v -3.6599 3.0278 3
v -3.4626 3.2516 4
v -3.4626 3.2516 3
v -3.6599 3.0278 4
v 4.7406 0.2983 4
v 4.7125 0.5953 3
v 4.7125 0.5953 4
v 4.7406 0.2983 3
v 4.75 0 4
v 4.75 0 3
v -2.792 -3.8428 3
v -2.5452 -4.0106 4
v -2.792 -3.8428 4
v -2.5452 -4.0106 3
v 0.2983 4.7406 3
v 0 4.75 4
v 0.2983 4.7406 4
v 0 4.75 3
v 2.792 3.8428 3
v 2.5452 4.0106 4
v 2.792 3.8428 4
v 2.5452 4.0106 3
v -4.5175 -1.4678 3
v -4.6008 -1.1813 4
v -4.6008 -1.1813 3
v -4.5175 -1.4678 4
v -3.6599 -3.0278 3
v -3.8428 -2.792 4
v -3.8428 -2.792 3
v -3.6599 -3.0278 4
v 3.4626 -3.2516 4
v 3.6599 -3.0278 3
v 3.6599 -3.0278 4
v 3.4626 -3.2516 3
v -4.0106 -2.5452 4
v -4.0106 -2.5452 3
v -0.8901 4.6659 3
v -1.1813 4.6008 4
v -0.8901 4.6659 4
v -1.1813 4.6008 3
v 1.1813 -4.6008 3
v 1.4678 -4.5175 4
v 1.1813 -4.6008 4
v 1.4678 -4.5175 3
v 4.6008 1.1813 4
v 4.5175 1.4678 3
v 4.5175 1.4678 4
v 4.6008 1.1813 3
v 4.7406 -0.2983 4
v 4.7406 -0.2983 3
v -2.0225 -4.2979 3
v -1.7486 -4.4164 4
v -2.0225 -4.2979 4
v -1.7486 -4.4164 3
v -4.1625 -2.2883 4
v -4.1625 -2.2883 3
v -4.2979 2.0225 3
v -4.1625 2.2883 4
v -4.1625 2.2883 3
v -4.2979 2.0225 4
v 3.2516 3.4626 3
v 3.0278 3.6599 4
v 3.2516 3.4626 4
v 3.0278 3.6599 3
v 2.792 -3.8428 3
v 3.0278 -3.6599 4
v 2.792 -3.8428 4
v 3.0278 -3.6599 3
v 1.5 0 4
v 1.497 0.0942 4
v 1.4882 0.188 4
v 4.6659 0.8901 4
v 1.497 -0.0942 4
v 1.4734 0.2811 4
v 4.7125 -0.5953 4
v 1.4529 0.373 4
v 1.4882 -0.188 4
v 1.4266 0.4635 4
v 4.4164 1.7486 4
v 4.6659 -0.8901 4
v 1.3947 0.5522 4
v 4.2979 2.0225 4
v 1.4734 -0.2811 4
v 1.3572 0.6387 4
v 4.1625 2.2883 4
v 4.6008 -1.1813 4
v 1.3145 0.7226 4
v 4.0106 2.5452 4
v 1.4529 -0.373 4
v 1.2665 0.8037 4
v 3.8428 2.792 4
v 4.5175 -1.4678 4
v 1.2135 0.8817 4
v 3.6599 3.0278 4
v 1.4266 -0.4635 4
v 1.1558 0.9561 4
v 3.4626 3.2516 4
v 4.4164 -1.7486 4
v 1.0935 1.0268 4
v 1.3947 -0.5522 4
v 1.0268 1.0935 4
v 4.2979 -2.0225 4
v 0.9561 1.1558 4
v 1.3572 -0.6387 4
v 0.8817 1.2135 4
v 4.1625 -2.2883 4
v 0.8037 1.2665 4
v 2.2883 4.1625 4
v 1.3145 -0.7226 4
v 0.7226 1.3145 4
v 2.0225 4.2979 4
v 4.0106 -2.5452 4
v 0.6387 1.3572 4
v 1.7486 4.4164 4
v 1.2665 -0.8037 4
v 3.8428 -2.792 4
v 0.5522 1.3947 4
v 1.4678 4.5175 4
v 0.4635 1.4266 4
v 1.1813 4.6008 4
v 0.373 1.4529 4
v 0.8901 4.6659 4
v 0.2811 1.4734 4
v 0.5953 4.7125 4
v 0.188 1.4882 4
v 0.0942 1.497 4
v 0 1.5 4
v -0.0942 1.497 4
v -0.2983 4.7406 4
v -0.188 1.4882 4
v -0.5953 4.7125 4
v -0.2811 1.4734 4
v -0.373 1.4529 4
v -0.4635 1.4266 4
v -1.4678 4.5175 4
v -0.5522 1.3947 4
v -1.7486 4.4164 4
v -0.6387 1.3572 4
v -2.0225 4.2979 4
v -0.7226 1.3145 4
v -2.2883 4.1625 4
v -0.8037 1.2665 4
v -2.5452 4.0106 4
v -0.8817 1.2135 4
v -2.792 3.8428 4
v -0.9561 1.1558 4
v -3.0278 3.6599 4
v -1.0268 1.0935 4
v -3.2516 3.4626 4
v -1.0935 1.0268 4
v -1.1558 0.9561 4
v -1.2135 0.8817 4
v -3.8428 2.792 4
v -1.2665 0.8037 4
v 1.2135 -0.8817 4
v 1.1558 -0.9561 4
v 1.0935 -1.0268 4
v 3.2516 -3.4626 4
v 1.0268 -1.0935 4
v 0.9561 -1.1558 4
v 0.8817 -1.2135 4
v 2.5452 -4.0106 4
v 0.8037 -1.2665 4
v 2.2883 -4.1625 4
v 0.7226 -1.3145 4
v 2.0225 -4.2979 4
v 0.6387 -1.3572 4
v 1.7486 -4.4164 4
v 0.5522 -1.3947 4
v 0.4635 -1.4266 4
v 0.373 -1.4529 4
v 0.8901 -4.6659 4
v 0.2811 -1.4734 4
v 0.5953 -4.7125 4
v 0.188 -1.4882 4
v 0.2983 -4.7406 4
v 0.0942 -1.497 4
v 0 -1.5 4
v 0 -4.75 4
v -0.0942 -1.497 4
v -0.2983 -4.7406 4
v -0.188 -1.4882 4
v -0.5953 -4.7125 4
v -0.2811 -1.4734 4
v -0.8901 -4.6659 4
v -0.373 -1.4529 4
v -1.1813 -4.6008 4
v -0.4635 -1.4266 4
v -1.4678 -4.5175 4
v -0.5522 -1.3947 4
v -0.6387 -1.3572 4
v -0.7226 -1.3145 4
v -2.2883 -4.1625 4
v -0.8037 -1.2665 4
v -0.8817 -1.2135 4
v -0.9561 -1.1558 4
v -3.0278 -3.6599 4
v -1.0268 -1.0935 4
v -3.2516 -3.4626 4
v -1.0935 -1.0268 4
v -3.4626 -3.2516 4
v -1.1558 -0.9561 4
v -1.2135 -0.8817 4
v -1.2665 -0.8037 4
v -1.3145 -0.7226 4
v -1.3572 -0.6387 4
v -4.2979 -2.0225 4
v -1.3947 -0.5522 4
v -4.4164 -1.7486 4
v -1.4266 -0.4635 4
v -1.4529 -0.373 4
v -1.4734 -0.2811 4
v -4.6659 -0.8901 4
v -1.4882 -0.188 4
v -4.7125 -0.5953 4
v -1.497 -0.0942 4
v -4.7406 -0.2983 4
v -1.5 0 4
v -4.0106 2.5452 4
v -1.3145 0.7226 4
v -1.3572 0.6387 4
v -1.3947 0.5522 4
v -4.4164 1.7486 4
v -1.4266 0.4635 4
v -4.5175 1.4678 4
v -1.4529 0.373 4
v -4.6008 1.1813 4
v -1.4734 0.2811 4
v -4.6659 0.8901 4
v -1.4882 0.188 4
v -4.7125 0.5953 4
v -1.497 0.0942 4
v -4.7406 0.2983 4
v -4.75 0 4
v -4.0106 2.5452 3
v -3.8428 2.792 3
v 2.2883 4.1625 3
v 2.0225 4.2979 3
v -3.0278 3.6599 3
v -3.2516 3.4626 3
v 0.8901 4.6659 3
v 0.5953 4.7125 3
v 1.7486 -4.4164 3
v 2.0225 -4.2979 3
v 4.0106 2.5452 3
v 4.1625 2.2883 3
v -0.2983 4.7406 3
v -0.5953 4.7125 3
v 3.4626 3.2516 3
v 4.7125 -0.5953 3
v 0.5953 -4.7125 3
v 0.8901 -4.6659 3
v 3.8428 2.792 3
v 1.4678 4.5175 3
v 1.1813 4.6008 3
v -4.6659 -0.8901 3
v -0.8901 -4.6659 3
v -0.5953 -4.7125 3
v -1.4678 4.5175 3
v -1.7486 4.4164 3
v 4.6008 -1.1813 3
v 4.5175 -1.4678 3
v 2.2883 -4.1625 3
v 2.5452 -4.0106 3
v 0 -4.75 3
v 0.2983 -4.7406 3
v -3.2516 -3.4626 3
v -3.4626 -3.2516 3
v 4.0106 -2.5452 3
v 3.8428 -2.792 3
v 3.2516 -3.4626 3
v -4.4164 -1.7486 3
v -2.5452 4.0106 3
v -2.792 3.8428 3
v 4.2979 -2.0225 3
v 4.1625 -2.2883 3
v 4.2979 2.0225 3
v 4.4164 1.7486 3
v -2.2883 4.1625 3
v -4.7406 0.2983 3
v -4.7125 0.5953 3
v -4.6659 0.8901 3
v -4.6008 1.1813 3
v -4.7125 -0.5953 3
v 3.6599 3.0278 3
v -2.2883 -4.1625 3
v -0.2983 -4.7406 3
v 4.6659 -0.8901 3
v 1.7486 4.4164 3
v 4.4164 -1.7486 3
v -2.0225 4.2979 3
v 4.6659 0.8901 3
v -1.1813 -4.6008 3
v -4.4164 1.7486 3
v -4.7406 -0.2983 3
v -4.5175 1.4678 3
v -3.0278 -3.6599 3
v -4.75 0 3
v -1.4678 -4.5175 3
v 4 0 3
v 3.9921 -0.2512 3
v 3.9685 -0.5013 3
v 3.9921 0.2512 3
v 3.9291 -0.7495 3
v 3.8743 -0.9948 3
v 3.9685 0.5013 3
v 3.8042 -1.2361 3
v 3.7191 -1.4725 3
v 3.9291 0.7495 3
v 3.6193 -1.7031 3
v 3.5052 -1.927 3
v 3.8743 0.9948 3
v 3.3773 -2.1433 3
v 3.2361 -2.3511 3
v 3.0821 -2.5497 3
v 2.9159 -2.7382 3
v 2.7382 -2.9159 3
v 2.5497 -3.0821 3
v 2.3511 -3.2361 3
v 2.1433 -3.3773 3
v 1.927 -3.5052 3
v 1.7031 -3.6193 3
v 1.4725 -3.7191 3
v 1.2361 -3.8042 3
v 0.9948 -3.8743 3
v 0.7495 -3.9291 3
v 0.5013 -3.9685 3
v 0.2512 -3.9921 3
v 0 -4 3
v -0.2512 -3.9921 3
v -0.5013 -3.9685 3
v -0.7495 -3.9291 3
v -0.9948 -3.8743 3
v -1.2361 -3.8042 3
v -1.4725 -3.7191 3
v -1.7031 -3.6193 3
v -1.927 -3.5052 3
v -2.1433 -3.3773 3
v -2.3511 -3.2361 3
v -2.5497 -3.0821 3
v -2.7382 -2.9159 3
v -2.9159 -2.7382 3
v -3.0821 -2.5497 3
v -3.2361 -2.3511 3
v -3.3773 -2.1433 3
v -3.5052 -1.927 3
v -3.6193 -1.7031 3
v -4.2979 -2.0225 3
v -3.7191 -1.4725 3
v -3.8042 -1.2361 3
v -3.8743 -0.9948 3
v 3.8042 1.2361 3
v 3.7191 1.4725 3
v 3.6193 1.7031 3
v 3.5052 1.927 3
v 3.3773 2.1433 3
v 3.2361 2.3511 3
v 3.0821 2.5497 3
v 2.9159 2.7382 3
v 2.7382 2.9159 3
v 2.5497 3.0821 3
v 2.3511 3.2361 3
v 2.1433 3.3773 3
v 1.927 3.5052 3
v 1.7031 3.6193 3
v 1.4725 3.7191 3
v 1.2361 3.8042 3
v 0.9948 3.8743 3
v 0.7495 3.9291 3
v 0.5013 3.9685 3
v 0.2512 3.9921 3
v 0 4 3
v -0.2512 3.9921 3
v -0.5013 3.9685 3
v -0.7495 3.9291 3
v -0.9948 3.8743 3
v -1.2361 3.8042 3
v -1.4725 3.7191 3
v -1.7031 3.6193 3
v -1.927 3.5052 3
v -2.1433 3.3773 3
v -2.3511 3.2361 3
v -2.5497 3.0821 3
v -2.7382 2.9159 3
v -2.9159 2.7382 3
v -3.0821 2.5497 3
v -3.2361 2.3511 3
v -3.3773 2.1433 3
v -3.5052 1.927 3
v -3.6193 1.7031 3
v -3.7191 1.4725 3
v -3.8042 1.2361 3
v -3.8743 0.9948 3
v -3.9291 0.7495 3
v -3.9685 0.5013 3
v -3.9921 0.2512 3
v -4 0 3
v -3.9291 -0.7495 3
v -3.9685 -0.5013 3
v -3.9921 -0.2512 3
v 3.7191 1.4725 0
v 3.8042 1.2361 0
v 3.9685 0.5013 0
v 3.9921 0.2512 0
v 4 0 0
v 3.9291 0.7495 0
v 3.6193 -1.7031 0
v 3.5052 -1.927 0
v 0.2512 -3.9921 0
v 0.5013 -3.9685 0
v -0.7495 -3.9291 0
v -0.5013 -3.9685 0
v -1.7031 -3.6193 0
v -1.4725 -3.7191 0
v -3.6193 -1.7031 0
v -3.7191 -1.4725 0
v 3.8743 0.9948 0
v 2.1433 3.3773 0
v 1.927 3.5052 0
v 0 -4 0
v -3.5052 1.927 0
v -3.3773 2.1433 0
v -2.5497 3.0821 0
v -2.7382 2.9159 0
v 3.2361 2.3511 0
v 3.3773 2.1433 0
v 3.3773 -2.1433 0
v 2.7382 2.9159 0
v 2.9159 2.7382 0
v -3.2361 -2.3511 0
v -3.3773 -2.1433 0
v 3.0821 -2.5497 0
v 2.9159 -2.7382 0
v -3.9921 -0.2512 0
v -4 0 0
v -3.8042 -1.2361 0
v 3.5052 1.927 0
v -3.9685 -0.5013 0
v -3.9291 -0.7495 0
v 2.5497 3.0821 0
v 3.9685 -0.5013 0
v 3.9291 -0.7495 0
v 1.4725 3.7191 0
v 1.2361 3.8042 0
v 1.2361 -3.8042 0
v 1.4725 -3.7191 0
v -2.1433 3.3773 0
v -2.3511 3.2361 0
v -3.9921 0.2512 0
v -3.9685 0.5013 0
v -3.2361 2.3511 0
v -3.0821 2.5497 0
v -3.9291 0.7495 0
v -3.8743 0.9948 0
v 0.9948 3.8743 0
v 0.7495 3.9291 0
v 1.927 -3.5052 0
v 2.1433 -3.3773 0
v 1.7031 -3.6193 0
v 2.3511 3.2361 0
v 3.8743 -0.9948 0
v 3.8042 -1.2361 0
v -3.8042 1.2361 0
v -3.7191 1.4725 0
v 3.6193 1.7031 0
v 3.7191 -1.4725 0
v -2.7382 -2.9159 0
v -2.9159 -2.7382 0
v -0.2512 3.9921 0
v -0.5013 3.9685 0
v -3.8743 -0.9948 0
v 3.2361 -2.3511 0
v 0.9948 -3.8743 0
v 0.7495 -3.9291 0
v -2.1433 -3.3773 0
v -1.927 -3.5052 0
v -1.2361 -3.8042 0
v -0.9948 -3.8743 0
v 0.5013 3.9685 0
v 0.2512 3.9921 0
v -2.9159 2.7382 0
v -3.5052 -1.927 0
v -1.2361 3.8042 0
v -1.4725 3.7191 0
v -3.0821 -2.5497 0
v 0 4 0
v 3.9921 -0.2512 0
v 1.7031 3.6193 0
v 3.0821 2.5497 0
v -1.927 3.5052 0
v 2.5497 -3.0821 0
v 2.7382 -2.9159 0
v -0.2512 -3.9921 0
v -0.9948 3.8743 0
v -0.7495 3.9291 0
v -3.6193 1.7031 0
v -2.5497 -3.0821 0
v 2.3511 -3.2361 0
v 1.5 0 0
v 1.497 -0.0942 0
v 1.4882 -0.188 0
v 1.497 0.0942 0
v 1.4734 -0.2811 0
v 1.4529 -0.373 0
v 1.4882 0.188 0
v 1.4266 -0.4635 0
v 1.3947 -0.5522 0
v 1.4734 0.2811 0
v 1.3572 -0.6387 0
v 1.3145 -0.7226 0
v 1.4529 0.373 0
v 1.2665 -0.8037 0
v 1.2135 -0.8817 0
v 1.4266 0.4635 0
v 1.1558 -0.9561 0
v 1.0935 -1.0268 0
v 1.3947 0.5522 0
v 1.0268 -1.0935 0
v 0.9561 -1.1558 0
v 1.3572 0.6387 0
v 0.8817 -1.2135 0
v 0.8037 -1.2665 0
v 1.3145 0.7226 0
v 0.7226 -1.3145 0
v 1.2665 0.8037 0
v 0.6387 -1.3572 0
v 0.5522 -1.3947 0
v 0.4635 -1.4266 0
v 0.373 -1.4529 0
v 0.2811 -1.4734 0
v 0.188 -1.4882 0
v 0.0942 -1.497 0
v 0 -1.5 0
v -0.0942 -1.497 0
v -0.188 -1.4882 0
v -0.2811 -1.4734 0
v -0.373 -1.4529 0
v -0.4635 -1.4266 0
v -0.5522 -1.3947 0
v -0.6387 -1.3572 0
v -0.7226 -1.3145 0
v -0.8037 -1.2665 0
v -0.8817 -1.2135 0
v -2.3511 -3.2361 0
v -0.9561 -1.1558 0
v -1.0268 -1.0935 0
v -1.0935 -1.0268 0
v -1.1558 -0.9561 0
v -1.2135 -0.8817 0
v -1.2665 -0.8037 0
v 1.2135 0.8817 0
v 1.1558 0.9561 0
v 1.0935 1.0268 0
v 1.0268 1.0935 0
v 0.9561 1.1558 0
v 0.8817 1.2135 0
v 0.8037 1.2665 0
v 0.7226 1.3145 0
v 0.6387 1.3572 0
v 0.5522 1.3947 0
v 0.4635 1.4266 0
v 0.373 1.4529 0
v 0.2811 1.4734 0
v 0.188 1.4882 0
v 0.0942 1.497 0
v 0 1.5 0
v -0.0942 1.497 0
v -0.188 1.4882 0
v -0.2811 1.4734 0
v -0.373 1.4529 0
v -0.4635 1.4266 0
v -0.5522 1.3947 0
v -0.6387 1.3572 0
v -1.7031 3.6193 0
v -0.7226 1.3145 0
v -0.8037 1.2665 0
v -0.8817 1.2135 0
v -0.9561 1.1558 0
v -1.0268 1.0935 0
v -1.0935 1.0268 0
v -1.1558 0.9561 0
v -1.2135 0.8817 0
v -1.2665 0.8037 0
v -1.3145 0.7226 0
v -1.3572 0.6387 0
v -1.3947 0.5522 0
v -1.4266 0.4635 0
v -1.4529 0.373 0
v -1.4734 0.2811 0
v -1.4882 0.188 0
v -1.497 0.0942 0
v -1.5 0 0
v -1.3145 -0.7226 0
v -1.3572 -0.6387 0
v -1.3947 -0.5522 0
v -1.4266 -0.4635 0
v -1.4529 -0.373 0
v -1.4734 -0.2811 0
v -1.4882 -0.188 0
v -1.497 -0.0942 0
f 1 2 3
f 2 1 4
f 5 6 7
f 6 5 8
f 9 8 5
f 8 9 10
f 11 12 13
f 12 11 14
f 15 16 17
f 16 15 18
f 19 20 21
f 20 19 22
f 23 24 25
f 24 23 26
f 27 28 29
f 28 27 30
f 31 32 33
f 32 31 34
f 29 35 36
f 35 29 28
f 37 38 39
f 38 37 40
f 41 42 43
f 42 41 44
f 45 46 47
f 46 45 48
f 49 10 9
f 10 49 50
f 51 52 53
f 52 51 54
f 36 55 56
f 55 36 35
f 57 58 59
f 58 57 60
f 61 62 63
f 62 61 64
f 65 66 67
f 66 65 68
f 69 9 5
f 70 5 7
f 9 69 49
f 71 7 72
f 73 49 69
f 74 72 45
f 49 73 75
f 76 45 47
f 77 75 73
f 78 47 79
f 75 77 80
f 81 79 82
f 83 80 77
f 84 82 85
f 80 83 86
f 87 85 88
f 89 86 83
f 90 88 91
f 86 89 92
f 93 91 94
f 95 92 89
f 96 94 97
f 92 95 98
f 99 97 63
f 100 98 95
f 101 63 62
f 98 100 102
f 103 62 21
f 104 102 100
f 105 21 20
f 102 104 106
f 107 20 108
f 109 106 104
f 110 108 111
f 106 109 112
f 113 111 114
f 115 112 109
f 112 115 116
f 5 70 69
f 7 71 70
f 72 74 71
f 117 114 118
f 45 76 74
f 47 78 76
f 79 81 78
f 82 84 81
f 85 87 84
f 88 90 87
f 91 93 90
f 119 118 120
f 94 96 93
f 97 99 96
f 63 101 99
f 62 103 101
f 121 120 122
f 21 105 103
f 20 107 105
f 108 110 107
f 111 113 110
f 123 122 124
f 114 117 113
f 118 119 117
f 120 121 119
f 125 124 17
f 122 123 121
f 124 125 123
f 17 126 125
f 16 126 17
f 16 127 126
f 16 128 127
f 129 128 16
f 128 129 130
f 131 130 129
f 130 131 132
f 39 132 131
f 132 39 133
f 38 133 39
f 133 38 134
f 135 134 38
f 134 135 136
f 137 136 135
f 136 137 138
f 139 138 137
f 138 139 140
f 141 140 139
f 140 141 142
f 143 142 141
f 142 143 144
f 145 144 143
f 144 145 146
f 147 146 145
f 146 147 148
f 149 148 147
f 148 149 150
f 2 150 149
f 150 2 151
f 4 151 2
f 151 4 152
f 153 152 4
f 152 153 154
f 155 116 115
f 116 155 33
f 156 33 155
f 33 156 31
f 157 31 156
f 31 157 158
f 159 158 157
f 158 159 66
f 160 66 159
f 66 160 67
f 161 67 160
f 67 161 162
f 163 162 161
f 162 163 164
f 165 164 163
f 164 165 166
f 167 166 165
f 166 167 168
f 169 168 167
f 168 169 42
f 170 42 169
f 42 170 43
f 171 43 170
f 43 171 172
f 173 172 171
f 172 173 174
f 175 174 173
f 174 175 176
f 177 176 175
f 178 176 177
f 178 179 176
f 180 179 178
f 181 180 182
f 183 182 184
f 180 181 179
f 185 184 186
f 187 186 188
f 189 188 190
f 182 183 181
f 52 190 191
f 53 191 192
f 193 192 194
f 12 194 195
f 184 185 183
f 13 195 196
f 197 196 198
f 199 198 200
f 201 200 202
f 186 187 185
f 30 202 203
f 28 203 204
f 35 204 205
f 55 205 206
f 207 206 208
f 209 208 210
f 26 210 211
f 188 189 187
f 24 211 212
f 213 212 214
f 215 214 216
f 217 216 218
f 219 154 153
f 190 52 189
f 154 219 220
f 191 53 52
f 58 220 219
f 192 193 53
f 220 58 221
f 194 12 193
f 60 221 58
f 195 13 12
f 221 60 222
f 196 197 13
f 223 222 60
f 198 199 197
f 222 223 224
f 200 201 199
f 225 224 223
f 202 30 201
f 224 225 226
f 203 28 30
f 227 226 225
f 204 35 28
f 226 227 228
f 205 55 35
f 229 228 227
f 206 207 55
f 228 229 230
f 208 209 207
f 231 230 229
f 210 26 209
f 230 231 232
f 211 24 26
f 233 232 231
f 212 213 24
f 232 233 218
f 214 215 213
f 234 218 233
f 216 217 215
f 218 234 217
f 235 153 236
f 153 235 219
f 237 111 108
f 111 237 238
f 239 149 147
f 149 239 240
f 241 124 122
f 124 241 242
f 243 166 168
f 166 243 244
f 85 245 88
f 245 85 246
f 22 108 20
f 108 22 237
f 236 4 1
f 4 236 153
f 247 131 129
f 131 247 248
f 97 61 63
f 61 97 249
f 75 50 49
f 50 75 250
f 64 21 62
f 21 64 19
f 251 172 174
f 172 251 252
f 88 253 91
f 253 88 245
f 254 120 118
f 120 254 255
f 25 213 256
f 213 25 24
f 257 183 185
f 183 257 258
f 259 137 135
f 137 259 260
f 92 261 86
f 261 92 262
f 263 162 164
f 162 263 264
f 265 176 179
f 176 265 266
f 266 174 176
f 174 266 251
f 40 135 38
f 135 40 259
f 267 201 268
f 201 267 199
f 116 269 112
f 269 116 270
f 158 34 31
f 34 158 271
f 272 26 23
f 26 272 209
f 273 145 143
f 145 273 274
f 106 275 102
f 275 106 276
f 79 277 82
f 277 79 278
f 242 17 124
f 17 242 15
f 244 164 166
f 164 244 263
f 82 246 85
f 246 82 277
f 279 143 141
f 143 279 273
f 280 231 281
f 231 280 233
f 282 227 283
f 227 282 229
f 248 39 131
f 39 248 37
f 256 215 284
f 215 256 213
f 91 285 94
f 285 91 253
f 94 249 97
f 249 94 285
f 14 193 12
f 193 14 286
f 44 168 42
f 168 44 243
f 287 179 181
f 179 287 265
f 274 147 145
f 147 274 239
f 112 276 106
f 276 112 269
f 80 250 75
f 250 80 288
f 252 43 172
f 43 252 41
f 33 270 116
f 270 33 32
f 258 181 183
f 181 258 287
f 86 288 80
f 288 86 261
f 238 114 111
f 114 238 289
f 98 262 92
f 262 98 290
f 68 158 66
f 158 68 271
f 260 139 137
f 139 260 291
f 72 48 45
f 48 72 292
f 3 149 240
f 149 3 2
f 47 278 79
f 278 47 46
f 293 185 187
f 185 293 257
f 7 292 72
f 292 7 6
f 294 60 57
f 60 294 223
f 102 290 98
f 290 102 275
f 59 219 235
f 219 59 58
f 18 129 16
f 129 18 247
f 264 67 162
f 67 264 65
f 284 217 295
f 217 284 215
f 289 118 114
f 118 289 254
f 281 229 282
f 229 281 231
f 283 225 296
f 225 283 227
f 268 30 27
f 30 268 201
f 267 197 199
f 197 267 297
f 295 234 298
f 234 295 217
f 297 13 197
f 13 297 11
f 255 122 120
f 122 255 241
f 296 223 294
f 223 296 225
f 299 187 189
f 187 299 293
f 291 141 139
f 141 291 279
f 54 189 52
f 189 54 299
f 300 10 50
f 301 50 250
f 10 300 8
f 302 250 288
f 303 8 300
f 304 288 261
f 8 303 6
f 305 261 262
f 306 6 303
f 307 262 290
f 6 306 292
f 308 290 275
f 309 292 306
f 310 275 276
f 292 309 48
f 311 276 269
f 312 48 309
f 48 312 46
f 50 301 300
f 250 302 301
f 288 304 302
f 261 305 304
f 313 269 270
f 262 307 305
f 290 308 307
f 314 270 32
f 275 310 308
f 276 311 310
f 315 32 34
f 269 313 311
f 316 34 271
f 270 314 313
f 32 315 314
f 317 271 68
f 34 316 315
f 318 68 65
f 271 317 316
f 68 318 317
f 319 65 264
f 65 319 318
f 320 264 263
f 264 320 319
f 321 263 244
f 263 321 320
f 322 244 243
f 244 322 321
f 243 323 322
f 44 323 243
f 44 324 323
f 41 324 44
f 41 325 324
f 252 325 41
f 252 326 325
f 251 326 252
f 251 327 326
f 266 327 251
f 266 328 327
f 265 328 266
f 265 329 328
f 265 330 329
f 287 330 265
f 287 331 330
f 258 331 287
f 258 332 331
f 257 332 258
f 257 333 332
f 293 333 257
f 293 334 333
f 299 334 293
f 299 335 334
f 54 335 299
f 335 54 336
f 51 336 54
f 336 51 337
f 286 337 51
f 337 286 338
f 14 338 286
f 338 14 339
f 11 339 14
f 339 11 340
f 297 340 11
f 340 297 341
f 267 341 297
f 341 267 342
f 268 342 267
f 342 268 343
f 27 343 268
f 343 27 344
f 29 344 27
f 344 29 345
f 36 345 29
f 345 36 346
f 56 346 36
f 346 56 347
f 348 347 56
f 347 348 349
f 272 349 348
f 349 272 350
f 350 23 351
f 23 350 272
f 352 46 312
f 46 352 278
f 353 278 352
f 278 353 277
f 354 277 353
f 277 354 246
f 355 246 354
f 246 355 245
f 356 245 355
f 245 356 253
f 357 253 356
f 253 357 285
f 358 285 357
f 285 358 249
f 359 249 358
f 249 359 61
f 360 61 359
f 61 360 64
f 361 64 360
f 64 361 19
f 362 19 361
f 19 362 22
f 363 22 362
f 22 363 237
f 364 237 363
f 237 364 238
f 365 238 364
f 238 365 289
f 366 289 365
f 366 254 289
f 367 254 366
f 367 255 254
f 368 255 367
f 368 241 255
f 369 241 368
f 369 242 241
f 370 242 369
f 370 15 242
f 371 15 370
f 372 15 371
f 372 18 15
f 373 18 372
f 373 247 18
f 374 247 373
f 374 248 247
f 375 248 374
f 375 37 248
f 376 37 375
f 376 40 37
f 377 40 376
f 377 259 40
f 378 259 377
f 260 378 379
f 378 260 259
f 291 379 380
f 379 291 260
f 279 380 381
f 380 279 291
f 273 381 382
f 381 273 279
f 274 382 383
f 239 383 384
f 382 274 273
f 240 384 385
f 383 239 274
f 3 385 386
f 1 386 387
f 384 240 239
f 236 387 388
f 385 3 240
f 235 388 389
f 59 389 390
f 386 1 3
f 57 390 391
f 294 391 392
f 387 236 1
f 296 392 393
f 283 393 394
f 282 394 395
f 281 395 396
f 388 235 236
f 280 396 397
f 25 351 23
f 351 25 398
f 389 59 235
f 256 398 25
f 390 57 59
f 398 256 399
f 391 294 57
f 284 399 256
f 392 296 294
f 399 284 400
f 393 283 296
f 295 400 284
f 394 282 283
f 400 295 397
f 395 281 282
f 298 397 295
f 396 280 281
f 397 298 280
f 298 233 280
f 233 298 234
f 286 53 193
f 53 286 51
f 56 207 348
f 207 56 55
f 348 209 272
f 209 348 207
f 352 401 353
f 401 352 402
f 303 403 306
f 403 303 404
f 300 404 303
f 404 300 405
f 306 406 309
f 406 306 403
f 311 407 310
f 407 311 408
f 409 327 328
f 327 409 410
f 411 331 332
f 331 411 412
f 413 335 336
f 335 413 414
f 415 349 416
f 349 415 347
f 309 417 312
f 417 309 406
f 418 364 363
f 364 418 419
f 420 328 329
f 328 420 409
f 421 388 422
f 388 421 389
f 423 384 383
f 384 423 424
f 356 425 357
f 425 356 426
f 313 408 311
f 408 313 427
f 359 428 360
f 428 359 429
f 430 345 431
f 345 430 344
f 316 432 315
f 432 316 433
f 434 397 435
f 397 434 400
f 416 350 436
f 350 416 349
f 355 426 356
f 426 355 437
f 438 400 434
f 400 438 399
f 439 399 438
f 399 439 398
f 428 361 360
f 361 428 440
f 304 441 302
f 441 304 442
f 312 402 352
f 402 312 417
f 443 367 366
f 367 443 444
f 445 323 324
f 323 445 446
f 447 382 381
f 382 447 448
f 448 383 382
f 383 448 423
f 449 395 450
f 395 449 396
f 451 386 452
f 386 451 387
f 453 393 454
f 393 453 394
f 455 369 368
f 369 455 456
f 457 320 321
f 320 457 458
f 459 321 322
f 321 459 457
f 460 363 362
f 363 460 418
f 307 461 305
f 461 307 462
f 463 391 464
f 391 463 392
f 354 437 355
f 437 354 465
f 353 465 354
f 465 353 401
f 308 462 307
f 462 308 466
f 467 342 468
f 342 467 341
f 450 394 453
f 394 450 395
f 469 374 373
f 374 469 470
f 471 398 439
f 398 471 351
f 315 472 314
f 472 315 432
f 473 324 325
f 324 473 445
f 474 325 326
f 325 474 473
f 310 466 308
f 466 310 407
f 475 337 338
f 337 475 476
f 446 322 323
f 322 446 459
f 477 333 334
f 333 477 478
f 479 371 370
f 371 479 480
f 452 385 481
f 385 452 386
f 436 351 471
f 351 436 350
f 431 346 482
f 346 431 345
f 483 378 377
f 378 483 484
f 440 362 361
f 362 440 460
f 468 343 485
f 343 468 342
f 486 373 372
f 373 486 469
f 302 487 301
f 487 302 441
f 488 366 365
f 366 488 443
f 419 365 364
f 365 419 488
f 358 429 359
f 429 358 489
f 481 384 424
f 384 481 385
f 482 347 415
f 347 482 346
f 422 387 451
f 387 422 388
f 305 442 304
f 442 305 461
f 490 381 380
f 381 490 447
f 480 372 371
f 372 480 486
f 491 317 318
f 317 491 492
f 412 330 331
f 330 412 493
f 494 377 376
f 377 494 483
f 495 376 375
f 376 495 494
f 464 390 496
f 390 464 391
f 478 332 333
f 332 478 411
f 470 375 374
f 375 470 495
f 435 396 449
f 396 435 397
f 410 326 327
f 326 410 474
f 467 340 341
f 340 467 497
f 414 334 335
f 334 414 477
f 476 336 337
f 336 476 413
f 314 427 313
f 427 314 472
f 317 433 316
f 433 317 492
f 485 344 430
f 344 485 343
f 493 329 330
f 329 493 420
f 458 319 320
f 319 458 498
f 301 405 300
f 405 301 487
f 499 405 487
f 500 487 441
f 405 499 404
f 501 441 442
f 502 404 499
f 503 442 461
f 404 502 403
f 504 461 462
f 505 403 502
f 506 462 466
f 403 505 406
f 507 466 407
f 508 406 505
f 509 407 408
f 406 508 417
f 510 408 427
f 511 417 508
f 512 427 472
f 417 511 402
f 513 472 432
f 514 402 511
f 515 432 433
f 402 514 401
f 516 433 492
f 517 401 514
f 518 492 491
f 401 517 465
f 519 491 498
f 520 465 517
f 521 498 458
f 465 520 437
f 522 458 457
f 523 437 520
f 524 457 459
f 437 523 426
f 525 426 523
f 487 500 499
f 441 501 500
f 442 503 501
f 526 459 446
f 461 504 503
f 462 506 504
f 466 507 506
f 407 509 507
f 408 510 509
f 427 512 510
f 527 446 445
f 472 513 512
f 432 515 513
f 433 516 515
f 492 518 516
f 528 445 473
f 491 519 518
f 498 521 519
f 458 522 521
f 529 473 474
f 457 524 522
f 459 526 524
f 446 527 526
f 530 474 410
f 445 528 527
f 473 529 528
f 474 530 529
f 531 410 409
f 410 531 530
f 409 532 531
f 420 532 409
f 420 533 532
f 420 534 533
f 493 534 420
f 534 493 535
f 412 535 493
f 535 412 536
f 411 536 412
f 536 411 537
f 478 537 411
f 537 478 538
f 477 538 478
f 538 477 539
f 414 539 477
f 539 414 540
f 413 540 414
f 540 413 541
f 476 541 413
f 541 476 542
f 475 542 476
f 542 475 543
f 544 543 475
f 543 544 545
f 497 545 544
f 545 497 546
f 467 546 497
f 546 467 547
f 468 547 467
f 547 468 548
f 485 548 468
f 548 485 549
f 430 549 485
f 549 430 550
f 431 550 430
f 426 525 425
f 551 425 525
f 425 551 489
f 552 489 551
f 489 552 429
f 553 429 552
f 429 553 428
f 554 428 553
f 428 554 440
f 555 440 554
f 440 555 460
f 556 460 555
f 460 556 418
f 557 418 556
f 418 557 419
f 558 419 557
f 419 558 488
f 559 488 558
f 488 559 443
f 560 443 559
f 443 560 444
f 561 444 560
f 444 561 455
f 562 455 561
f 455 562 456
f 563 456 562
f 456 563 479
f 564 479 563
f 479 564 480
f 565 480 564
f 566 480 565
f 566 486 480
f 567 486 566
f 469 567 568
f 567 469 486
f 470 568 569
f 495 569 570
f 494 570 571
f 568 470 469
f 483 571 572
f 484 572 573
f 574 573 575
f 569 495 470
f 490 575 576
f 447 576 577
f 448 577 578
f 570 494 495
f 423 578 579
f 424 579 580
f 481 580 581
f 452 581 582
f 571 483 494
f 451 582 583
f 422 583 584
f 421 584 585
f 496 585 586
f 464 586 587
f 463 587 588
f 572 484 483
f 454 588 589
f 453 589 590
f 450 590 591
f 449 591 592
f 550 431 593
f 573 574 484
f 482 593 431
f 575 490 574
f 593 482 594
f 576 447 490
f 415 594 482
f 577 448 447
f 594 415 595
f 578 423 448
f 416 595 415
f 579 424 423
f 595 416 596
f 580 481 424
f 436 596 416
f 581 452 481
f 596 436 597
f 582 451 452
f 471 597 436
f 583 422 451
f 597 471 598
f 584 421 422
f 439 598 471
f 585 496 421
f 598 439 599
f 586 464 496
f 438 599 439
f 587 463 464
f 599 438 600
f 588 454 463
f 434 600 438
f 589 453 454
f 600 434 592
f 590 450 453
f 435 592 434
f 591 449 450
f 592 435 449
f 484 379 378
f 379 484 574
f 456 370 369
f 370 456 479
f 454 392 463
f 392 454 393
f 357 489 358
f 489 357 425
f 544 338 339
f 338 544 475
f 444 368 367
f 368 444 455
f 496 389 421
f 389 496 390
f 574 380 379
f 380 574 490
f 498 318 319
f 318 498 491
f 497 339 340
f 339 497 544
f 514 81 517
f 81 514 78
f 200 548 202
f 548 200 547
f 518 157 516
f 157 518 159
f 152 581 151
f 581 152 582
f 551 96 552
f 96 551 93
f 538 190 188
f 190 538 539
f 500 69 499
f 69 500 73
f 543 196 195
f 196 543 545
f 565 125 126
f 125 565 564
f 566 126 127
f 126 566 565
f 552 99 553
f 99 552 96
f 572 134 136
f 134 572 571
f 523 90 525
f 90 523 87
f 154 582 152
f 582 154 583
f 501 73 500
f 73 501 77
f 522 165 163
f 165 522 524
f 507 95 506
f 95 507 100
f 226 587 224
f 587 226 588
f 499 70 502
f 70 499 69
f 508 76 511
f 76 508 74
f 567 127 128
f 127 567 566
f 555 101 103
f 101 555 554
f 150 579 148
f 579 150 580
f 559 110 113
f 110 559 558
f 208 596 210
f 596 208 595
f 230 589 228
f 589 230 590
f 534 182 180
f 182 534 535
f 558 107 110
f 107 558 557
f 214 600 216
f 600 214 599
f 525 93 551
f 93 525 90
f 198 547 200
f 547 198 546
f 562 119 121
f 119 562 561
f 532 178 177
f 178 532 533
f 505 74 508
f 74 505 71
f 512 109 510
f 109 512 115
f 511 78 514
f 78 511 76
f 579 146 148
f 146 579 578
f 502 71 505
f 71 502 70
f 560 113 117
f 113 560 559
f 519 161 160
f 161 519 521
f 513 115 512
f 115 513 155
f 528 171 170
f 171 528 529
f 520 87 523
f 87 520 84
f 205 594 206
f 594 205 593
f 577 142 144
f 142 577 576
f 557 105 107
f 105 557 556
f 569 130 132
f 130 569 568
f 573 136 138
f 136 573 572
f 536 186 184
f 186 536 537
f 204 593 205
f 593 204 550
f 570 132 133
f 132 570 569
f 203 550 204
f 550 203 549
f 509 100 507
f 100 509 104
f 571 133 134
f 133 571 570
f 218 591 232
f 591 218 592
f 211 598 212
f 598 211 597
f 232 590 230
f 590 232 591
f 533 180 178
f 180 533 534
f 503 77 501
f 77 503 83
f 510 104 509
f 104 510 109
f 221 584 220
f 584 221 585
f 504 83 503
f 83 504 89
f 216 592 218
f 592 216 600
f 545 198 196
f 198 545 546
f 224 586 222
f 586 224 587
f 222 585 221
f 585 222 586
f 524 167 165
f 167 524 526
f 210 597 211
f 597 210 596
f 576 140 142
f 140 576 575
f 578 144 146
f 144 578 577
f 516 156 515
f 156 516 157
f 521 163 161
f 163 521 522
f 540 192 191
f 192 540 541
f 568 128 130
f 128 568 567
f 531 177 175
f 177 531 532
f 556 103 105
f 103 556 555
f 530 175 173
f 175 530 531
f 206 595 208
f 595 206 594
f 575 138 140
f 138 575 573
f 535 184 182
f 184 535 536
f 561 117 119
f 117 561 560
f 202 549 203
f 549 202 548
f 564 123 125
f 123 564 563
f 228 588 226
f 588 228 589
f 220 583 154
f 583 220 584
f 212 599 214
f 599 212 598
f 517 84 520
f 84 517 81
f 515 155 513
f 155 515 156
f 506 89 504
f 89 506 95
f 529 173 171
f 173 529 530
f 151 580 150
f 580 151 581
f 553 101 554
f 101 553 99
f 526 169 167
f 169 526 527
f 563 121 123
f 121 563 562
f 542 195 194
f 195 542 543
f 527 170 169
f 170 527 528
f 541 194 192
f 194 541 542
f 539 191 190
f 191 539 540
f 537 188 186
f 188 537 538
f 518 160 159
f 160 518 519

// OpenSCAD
$fn=100;






Bearing();









module Bearing(){

    difference(){
        union(){
            translate([0,0,3]) cylinder(h=1, d=9.5);
            cylinder(h=3, d=8);
        }
        translate([0,0,-.5])cylinder(h=6, d=3);
    }
}
